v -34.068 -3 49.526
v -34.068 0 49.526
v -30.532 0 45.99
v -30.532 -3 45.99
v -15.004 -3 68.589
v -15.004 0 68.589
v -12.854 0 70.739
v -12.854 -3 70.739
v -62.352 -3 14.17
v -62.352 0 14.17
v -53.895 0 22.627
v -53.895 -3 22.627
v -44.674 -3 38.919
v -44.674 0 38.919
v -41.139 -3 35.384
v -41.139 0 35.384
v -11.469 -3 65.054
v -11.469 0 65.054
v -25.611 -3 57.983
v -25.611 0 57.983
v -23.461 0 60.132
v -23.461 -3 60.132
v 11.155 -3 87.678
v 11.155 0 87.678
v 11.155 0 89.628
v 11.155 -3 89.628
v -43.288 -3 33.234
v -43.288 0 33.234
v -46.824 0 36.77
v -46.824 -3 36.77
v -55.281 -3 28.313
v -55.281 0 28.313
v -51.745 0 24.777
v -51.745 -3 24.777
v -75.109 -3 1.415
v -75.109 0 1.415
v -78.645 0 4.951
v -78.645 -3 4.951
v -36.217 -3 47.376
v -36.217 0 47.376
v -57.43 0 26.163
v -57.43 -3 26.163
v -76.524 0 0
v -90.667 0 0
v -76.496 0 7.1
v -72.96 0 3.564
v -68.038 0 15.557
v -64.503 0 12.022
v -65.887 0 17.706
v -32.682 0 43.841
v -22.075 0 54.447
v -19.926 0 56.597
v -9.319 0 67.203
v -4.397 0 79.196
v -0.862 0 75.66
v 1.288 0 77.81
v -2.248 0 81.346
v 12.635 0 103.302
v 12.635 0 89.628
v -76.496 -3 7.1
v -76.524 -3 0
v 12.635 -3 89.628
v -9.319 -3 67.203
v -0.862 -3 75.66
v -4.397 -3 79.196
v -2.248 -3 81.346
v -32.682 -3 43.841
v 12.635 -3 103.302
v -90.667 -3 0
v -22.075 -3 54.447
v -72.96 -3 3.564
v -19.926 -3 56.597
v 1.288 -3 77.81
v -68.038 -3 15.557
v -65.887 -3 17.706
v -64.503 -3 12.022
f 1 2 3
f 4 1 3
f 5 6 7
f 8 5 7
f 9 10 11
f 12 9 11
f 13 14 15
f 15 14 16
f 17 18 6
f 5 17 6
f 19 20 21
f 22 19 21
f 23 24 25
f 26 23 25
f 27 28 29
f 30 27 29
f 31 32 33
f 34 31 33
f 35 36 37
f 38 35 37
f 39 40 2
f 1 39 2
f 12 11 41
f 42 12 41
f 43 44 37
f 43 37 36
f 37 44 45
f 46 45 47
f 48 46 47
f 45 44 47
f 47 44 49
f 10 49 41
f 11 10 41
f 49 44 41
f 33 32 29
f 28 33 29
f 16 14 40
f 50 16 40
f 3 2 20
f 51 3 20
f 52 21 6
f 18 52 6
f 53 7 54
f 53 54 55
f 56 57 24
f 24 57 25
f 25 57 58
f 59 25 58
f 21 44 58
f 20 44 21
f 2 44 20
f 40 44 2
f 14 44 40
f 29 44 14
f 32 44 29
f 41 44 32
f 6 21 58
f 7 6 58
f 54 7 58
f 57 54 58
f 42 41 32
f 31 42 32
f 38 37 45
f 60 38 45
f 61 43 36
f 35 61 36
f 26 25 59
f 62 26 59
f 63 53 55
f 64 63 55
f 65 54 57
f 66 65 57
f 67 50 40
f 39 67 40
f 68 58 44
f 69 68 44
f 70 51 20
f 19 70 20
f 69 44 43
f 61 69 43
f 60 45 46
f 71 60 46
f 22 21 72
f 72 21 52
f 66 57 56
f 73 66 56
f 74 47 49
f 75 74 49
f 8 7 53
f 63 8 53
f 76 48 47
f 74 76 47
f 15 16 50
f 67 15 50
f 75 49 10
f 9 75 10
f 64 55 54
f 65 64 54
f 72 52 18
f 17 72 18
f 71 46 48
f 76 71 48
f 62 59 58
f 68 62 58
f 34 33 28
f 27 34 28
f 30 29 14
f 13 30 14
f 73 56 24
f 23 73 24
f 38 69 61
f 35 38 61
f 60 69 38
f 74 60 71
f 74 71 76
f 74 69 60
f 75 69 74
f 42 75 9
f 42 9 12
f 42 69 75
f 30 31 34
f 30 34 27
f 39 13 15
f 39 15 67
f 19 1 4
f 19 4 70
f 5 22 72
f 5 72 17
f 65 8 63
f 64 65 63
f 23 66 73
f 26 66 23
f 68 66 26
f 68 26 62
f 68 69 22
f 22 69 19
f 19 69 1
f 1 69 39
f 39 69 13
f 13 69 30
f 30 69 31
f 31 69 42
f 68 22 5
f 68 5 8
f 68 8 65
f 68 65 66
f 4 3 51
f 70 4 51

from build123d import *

# Parameters (mm, degrees)
F1_DEPTH = 3


with BuildPart() as f1:
    # F0 (on Front) → F1 (new body)
    with BuildSketch(Plane.XZ):
        Polygon((-75.109162, 1.415248), (-78.644696, 4.950781), (-76.495773, 7.099704), (-72.960239, 3.56417), (-64.50256, 12.021849), (-68.038094, 15.557383), (-65.887456, 17.705954), (-62.351922, 14.17042), (-53.894925, 22.627417), (-57.430459, 26.162951), (-55.280854, 28.312556), (-51.74532, 24.777022), (-43.288323, 33.234019), (-46.823857, 36.769553), (-44.674252, 38.919157), (-41.138718, 35.383623), (-32.681721, 43.84062), (-36.217255, 47.376154), (-34.067651, 49.525759), (-30.532117, 45.990225), (-22.07512, 54.447222), (-25.610654, 57.982756), (-23.461049, 60.132361), (-19.925515, 56.596827), (-11.468518, 65.053824), (-15.004052, 68.589358), (-12.854447, 70.738962), (-9.318913, 67.203429), (-0.861916, 75.660426), (-4.39745, 79.19596), (-2.247846, 81.345564), (1.287688, 77.81003), (10.635368, 87.15771), (11.155368, 87.67771), (11.155368, 88.67771), (11.155368, 89.62771), (12.635368, 89.62771), (12.635368, 103.301913), (12.155368, 102.821913), (-90.666545, 0), (-76.52441, 0), align=None)
    extrude(amount=F1_DEPTH)


solid = f1.part
